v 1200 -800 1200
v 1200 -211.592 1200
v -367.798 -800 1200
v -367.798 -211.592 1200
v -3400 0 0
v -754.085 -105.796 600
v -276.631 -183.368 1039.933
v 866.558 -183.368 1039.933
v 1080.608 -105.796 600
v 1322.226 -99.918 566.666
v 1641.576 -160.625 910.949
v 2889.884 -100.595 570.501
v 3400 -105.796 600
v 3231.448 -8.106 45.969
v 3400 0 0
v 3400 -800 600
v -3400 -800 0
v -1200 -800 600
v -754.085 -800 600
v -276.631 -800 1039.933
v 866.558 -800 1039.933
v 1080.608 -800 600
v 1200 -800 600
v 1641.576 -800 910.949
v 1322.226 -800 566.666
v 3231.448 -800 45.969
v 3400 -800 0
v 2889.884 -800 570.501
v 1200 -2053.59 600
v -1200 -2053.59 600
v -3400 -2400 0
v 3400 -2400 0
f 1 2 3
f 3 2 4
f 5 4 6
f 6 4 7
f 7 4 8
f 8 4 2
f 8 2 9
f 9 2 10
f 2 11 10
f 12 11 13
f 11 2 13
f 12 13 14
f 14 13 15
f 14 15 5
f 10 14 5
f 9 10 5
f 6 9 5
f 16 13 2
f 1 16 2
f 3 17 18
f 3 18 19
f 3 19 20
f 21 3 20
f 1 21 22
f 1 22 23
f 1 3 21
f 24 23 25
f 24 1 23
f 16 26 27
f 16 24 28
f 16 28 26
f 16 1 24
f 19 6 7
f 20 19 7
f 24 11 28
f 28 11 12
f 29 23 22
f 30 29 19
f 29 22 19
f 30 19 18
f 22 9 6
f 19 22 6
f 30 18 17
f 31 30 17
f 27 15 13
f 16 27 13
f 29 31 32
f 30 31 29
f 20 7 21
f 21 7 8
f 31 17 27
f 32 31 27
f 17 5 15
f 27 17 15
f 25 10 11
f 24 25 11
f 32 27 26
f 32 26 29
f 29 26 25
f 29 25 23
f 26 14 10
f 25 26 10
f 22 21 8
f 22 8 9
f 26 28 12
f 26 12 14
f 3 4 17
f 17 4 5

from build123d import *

# Parameters (mm, degrees)
F2_DEPTH = 800
F3_DEPTH = 2400
F5_DEPTH = 6800.001


# Not quite as in the source:
# - a feature names something its author has since deleted; it is built from what else it names


with BuildPart() as f2:
    # F1 (on Front) → F2 (new body)
    with BuildSketch(Plane.XZ):
        Polygon((3231.4479728419, 45.9687346795), (3400, 0), (3400, 600), (1200, 1200), (-367.7977621555, 1200), (-3400, 0), (-1200, 600), (-754.085123539, 600), (-276.6310870647, 1039.9327278137), (866.5578365326, 1039.9327278137), (1168.6351299286, 1039.9327278137), (1641.5758518072, 910.9488945741), (2889.8836052394, 570.5013254562), align=None)
        Polygon((1200, 600), (1322.2261014351, 566.6656086995), (1641.5758518072, 910.9488945741), (1168.6351299286, 1039.9327278137), (866.5578365326, 1039.9327278137), (1080.6080102921, 600), align=None)
    extrude(amount=F2_DEPTH)

    # F1 (on Front) → F3 (join)
    with BuildSketch(Plane.XZ):
        Polygon((-3400, 0), (3400, 0), (3231.4479728419, 45.9687346795), (1322.2261014351, 566.6656086995), (1200, 600), (1080.6080102921, 600), (-754.085123539, 600), (-1200, 600), align=None)
    extrude(amount=F3_DEPTH)

    # F4 (on face) → F5 (cut, through all)
    with BuildSketch(Plane.YZ.offset(3400)):
        Polygon((0, 600), (0, 1200), (-211.5923768502, 1200), (-105.7961884251, 600), align=None)
        Polygon((0, 0), (0, 600), (-105.7961884251, 600), align=None)
        Polygon((-2400, 600), (-2400, 0), (-2053.5898384862, 600), align=None)
    extrude(amount=-F5_DEPTH, mode=Mode.SUBTRACT)


solid = f2.part
